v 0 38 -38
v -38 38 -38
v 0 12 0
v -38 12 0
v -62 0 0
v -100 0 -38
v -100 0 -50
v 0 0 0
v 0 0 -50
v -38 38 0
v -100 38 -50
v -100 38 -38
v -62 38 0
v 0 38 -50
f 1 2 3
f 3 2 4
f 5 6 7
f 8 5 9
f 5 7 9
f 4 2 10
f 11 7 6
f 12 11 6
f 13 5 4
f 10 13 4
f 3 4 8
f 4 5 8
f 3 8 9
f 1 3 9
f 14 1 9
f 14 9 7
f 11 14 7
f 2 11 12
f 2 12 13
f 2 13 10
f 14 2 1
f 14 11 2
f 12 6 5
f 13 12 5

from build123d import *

# Parameters (mm, degrees)
BOSS_EXTRUDE1_DEPTH     = 38
CUT_EXTRUDE8_DEPTH      = 119.084715353
CUT_EXTRUDE8_DEPTH_BACK = 38


with BuildPart() as part:
    # Sketch1 → Boss-Extrude1 (new body)
    with BuildSketch(Plane(origin=(0, 0, 0), x_dir=(1, 0, 0), z_dir=(0, 1, 0))):
        Polygon((-100, 50), (-100, 38), (-62, 0), (0, 0), (0, 50), align=None)
    extrude(amount=BOSS_EXTRUDE1_DEPTH)

    # Sketch2 → Cut-Extrude8 (cut, two sides: drawn at the far end of the back side and taken through both)
    with BuildSketch(Plane(origin=(0, 0, 0), x_dir=(0, 0, -1), z_dir=(1, 0, 0)).offset(-CUT_EXTRUDE8_DEPTH_BACK)):
        Polygon((139.275123153, 107.293505315), (38, 38), (0, 12), (-101.275123153, -57.293505315), (-239.862133784, 145.256740991), (0.688112523, 309.843751622), align=None)
    extrude(amount=CUT_EXTRUDE8_DEPTH + CUT_EXTRUDE8_DEPTH_BACK, mode=Mode.SUBTRACT)


solid = part.part
